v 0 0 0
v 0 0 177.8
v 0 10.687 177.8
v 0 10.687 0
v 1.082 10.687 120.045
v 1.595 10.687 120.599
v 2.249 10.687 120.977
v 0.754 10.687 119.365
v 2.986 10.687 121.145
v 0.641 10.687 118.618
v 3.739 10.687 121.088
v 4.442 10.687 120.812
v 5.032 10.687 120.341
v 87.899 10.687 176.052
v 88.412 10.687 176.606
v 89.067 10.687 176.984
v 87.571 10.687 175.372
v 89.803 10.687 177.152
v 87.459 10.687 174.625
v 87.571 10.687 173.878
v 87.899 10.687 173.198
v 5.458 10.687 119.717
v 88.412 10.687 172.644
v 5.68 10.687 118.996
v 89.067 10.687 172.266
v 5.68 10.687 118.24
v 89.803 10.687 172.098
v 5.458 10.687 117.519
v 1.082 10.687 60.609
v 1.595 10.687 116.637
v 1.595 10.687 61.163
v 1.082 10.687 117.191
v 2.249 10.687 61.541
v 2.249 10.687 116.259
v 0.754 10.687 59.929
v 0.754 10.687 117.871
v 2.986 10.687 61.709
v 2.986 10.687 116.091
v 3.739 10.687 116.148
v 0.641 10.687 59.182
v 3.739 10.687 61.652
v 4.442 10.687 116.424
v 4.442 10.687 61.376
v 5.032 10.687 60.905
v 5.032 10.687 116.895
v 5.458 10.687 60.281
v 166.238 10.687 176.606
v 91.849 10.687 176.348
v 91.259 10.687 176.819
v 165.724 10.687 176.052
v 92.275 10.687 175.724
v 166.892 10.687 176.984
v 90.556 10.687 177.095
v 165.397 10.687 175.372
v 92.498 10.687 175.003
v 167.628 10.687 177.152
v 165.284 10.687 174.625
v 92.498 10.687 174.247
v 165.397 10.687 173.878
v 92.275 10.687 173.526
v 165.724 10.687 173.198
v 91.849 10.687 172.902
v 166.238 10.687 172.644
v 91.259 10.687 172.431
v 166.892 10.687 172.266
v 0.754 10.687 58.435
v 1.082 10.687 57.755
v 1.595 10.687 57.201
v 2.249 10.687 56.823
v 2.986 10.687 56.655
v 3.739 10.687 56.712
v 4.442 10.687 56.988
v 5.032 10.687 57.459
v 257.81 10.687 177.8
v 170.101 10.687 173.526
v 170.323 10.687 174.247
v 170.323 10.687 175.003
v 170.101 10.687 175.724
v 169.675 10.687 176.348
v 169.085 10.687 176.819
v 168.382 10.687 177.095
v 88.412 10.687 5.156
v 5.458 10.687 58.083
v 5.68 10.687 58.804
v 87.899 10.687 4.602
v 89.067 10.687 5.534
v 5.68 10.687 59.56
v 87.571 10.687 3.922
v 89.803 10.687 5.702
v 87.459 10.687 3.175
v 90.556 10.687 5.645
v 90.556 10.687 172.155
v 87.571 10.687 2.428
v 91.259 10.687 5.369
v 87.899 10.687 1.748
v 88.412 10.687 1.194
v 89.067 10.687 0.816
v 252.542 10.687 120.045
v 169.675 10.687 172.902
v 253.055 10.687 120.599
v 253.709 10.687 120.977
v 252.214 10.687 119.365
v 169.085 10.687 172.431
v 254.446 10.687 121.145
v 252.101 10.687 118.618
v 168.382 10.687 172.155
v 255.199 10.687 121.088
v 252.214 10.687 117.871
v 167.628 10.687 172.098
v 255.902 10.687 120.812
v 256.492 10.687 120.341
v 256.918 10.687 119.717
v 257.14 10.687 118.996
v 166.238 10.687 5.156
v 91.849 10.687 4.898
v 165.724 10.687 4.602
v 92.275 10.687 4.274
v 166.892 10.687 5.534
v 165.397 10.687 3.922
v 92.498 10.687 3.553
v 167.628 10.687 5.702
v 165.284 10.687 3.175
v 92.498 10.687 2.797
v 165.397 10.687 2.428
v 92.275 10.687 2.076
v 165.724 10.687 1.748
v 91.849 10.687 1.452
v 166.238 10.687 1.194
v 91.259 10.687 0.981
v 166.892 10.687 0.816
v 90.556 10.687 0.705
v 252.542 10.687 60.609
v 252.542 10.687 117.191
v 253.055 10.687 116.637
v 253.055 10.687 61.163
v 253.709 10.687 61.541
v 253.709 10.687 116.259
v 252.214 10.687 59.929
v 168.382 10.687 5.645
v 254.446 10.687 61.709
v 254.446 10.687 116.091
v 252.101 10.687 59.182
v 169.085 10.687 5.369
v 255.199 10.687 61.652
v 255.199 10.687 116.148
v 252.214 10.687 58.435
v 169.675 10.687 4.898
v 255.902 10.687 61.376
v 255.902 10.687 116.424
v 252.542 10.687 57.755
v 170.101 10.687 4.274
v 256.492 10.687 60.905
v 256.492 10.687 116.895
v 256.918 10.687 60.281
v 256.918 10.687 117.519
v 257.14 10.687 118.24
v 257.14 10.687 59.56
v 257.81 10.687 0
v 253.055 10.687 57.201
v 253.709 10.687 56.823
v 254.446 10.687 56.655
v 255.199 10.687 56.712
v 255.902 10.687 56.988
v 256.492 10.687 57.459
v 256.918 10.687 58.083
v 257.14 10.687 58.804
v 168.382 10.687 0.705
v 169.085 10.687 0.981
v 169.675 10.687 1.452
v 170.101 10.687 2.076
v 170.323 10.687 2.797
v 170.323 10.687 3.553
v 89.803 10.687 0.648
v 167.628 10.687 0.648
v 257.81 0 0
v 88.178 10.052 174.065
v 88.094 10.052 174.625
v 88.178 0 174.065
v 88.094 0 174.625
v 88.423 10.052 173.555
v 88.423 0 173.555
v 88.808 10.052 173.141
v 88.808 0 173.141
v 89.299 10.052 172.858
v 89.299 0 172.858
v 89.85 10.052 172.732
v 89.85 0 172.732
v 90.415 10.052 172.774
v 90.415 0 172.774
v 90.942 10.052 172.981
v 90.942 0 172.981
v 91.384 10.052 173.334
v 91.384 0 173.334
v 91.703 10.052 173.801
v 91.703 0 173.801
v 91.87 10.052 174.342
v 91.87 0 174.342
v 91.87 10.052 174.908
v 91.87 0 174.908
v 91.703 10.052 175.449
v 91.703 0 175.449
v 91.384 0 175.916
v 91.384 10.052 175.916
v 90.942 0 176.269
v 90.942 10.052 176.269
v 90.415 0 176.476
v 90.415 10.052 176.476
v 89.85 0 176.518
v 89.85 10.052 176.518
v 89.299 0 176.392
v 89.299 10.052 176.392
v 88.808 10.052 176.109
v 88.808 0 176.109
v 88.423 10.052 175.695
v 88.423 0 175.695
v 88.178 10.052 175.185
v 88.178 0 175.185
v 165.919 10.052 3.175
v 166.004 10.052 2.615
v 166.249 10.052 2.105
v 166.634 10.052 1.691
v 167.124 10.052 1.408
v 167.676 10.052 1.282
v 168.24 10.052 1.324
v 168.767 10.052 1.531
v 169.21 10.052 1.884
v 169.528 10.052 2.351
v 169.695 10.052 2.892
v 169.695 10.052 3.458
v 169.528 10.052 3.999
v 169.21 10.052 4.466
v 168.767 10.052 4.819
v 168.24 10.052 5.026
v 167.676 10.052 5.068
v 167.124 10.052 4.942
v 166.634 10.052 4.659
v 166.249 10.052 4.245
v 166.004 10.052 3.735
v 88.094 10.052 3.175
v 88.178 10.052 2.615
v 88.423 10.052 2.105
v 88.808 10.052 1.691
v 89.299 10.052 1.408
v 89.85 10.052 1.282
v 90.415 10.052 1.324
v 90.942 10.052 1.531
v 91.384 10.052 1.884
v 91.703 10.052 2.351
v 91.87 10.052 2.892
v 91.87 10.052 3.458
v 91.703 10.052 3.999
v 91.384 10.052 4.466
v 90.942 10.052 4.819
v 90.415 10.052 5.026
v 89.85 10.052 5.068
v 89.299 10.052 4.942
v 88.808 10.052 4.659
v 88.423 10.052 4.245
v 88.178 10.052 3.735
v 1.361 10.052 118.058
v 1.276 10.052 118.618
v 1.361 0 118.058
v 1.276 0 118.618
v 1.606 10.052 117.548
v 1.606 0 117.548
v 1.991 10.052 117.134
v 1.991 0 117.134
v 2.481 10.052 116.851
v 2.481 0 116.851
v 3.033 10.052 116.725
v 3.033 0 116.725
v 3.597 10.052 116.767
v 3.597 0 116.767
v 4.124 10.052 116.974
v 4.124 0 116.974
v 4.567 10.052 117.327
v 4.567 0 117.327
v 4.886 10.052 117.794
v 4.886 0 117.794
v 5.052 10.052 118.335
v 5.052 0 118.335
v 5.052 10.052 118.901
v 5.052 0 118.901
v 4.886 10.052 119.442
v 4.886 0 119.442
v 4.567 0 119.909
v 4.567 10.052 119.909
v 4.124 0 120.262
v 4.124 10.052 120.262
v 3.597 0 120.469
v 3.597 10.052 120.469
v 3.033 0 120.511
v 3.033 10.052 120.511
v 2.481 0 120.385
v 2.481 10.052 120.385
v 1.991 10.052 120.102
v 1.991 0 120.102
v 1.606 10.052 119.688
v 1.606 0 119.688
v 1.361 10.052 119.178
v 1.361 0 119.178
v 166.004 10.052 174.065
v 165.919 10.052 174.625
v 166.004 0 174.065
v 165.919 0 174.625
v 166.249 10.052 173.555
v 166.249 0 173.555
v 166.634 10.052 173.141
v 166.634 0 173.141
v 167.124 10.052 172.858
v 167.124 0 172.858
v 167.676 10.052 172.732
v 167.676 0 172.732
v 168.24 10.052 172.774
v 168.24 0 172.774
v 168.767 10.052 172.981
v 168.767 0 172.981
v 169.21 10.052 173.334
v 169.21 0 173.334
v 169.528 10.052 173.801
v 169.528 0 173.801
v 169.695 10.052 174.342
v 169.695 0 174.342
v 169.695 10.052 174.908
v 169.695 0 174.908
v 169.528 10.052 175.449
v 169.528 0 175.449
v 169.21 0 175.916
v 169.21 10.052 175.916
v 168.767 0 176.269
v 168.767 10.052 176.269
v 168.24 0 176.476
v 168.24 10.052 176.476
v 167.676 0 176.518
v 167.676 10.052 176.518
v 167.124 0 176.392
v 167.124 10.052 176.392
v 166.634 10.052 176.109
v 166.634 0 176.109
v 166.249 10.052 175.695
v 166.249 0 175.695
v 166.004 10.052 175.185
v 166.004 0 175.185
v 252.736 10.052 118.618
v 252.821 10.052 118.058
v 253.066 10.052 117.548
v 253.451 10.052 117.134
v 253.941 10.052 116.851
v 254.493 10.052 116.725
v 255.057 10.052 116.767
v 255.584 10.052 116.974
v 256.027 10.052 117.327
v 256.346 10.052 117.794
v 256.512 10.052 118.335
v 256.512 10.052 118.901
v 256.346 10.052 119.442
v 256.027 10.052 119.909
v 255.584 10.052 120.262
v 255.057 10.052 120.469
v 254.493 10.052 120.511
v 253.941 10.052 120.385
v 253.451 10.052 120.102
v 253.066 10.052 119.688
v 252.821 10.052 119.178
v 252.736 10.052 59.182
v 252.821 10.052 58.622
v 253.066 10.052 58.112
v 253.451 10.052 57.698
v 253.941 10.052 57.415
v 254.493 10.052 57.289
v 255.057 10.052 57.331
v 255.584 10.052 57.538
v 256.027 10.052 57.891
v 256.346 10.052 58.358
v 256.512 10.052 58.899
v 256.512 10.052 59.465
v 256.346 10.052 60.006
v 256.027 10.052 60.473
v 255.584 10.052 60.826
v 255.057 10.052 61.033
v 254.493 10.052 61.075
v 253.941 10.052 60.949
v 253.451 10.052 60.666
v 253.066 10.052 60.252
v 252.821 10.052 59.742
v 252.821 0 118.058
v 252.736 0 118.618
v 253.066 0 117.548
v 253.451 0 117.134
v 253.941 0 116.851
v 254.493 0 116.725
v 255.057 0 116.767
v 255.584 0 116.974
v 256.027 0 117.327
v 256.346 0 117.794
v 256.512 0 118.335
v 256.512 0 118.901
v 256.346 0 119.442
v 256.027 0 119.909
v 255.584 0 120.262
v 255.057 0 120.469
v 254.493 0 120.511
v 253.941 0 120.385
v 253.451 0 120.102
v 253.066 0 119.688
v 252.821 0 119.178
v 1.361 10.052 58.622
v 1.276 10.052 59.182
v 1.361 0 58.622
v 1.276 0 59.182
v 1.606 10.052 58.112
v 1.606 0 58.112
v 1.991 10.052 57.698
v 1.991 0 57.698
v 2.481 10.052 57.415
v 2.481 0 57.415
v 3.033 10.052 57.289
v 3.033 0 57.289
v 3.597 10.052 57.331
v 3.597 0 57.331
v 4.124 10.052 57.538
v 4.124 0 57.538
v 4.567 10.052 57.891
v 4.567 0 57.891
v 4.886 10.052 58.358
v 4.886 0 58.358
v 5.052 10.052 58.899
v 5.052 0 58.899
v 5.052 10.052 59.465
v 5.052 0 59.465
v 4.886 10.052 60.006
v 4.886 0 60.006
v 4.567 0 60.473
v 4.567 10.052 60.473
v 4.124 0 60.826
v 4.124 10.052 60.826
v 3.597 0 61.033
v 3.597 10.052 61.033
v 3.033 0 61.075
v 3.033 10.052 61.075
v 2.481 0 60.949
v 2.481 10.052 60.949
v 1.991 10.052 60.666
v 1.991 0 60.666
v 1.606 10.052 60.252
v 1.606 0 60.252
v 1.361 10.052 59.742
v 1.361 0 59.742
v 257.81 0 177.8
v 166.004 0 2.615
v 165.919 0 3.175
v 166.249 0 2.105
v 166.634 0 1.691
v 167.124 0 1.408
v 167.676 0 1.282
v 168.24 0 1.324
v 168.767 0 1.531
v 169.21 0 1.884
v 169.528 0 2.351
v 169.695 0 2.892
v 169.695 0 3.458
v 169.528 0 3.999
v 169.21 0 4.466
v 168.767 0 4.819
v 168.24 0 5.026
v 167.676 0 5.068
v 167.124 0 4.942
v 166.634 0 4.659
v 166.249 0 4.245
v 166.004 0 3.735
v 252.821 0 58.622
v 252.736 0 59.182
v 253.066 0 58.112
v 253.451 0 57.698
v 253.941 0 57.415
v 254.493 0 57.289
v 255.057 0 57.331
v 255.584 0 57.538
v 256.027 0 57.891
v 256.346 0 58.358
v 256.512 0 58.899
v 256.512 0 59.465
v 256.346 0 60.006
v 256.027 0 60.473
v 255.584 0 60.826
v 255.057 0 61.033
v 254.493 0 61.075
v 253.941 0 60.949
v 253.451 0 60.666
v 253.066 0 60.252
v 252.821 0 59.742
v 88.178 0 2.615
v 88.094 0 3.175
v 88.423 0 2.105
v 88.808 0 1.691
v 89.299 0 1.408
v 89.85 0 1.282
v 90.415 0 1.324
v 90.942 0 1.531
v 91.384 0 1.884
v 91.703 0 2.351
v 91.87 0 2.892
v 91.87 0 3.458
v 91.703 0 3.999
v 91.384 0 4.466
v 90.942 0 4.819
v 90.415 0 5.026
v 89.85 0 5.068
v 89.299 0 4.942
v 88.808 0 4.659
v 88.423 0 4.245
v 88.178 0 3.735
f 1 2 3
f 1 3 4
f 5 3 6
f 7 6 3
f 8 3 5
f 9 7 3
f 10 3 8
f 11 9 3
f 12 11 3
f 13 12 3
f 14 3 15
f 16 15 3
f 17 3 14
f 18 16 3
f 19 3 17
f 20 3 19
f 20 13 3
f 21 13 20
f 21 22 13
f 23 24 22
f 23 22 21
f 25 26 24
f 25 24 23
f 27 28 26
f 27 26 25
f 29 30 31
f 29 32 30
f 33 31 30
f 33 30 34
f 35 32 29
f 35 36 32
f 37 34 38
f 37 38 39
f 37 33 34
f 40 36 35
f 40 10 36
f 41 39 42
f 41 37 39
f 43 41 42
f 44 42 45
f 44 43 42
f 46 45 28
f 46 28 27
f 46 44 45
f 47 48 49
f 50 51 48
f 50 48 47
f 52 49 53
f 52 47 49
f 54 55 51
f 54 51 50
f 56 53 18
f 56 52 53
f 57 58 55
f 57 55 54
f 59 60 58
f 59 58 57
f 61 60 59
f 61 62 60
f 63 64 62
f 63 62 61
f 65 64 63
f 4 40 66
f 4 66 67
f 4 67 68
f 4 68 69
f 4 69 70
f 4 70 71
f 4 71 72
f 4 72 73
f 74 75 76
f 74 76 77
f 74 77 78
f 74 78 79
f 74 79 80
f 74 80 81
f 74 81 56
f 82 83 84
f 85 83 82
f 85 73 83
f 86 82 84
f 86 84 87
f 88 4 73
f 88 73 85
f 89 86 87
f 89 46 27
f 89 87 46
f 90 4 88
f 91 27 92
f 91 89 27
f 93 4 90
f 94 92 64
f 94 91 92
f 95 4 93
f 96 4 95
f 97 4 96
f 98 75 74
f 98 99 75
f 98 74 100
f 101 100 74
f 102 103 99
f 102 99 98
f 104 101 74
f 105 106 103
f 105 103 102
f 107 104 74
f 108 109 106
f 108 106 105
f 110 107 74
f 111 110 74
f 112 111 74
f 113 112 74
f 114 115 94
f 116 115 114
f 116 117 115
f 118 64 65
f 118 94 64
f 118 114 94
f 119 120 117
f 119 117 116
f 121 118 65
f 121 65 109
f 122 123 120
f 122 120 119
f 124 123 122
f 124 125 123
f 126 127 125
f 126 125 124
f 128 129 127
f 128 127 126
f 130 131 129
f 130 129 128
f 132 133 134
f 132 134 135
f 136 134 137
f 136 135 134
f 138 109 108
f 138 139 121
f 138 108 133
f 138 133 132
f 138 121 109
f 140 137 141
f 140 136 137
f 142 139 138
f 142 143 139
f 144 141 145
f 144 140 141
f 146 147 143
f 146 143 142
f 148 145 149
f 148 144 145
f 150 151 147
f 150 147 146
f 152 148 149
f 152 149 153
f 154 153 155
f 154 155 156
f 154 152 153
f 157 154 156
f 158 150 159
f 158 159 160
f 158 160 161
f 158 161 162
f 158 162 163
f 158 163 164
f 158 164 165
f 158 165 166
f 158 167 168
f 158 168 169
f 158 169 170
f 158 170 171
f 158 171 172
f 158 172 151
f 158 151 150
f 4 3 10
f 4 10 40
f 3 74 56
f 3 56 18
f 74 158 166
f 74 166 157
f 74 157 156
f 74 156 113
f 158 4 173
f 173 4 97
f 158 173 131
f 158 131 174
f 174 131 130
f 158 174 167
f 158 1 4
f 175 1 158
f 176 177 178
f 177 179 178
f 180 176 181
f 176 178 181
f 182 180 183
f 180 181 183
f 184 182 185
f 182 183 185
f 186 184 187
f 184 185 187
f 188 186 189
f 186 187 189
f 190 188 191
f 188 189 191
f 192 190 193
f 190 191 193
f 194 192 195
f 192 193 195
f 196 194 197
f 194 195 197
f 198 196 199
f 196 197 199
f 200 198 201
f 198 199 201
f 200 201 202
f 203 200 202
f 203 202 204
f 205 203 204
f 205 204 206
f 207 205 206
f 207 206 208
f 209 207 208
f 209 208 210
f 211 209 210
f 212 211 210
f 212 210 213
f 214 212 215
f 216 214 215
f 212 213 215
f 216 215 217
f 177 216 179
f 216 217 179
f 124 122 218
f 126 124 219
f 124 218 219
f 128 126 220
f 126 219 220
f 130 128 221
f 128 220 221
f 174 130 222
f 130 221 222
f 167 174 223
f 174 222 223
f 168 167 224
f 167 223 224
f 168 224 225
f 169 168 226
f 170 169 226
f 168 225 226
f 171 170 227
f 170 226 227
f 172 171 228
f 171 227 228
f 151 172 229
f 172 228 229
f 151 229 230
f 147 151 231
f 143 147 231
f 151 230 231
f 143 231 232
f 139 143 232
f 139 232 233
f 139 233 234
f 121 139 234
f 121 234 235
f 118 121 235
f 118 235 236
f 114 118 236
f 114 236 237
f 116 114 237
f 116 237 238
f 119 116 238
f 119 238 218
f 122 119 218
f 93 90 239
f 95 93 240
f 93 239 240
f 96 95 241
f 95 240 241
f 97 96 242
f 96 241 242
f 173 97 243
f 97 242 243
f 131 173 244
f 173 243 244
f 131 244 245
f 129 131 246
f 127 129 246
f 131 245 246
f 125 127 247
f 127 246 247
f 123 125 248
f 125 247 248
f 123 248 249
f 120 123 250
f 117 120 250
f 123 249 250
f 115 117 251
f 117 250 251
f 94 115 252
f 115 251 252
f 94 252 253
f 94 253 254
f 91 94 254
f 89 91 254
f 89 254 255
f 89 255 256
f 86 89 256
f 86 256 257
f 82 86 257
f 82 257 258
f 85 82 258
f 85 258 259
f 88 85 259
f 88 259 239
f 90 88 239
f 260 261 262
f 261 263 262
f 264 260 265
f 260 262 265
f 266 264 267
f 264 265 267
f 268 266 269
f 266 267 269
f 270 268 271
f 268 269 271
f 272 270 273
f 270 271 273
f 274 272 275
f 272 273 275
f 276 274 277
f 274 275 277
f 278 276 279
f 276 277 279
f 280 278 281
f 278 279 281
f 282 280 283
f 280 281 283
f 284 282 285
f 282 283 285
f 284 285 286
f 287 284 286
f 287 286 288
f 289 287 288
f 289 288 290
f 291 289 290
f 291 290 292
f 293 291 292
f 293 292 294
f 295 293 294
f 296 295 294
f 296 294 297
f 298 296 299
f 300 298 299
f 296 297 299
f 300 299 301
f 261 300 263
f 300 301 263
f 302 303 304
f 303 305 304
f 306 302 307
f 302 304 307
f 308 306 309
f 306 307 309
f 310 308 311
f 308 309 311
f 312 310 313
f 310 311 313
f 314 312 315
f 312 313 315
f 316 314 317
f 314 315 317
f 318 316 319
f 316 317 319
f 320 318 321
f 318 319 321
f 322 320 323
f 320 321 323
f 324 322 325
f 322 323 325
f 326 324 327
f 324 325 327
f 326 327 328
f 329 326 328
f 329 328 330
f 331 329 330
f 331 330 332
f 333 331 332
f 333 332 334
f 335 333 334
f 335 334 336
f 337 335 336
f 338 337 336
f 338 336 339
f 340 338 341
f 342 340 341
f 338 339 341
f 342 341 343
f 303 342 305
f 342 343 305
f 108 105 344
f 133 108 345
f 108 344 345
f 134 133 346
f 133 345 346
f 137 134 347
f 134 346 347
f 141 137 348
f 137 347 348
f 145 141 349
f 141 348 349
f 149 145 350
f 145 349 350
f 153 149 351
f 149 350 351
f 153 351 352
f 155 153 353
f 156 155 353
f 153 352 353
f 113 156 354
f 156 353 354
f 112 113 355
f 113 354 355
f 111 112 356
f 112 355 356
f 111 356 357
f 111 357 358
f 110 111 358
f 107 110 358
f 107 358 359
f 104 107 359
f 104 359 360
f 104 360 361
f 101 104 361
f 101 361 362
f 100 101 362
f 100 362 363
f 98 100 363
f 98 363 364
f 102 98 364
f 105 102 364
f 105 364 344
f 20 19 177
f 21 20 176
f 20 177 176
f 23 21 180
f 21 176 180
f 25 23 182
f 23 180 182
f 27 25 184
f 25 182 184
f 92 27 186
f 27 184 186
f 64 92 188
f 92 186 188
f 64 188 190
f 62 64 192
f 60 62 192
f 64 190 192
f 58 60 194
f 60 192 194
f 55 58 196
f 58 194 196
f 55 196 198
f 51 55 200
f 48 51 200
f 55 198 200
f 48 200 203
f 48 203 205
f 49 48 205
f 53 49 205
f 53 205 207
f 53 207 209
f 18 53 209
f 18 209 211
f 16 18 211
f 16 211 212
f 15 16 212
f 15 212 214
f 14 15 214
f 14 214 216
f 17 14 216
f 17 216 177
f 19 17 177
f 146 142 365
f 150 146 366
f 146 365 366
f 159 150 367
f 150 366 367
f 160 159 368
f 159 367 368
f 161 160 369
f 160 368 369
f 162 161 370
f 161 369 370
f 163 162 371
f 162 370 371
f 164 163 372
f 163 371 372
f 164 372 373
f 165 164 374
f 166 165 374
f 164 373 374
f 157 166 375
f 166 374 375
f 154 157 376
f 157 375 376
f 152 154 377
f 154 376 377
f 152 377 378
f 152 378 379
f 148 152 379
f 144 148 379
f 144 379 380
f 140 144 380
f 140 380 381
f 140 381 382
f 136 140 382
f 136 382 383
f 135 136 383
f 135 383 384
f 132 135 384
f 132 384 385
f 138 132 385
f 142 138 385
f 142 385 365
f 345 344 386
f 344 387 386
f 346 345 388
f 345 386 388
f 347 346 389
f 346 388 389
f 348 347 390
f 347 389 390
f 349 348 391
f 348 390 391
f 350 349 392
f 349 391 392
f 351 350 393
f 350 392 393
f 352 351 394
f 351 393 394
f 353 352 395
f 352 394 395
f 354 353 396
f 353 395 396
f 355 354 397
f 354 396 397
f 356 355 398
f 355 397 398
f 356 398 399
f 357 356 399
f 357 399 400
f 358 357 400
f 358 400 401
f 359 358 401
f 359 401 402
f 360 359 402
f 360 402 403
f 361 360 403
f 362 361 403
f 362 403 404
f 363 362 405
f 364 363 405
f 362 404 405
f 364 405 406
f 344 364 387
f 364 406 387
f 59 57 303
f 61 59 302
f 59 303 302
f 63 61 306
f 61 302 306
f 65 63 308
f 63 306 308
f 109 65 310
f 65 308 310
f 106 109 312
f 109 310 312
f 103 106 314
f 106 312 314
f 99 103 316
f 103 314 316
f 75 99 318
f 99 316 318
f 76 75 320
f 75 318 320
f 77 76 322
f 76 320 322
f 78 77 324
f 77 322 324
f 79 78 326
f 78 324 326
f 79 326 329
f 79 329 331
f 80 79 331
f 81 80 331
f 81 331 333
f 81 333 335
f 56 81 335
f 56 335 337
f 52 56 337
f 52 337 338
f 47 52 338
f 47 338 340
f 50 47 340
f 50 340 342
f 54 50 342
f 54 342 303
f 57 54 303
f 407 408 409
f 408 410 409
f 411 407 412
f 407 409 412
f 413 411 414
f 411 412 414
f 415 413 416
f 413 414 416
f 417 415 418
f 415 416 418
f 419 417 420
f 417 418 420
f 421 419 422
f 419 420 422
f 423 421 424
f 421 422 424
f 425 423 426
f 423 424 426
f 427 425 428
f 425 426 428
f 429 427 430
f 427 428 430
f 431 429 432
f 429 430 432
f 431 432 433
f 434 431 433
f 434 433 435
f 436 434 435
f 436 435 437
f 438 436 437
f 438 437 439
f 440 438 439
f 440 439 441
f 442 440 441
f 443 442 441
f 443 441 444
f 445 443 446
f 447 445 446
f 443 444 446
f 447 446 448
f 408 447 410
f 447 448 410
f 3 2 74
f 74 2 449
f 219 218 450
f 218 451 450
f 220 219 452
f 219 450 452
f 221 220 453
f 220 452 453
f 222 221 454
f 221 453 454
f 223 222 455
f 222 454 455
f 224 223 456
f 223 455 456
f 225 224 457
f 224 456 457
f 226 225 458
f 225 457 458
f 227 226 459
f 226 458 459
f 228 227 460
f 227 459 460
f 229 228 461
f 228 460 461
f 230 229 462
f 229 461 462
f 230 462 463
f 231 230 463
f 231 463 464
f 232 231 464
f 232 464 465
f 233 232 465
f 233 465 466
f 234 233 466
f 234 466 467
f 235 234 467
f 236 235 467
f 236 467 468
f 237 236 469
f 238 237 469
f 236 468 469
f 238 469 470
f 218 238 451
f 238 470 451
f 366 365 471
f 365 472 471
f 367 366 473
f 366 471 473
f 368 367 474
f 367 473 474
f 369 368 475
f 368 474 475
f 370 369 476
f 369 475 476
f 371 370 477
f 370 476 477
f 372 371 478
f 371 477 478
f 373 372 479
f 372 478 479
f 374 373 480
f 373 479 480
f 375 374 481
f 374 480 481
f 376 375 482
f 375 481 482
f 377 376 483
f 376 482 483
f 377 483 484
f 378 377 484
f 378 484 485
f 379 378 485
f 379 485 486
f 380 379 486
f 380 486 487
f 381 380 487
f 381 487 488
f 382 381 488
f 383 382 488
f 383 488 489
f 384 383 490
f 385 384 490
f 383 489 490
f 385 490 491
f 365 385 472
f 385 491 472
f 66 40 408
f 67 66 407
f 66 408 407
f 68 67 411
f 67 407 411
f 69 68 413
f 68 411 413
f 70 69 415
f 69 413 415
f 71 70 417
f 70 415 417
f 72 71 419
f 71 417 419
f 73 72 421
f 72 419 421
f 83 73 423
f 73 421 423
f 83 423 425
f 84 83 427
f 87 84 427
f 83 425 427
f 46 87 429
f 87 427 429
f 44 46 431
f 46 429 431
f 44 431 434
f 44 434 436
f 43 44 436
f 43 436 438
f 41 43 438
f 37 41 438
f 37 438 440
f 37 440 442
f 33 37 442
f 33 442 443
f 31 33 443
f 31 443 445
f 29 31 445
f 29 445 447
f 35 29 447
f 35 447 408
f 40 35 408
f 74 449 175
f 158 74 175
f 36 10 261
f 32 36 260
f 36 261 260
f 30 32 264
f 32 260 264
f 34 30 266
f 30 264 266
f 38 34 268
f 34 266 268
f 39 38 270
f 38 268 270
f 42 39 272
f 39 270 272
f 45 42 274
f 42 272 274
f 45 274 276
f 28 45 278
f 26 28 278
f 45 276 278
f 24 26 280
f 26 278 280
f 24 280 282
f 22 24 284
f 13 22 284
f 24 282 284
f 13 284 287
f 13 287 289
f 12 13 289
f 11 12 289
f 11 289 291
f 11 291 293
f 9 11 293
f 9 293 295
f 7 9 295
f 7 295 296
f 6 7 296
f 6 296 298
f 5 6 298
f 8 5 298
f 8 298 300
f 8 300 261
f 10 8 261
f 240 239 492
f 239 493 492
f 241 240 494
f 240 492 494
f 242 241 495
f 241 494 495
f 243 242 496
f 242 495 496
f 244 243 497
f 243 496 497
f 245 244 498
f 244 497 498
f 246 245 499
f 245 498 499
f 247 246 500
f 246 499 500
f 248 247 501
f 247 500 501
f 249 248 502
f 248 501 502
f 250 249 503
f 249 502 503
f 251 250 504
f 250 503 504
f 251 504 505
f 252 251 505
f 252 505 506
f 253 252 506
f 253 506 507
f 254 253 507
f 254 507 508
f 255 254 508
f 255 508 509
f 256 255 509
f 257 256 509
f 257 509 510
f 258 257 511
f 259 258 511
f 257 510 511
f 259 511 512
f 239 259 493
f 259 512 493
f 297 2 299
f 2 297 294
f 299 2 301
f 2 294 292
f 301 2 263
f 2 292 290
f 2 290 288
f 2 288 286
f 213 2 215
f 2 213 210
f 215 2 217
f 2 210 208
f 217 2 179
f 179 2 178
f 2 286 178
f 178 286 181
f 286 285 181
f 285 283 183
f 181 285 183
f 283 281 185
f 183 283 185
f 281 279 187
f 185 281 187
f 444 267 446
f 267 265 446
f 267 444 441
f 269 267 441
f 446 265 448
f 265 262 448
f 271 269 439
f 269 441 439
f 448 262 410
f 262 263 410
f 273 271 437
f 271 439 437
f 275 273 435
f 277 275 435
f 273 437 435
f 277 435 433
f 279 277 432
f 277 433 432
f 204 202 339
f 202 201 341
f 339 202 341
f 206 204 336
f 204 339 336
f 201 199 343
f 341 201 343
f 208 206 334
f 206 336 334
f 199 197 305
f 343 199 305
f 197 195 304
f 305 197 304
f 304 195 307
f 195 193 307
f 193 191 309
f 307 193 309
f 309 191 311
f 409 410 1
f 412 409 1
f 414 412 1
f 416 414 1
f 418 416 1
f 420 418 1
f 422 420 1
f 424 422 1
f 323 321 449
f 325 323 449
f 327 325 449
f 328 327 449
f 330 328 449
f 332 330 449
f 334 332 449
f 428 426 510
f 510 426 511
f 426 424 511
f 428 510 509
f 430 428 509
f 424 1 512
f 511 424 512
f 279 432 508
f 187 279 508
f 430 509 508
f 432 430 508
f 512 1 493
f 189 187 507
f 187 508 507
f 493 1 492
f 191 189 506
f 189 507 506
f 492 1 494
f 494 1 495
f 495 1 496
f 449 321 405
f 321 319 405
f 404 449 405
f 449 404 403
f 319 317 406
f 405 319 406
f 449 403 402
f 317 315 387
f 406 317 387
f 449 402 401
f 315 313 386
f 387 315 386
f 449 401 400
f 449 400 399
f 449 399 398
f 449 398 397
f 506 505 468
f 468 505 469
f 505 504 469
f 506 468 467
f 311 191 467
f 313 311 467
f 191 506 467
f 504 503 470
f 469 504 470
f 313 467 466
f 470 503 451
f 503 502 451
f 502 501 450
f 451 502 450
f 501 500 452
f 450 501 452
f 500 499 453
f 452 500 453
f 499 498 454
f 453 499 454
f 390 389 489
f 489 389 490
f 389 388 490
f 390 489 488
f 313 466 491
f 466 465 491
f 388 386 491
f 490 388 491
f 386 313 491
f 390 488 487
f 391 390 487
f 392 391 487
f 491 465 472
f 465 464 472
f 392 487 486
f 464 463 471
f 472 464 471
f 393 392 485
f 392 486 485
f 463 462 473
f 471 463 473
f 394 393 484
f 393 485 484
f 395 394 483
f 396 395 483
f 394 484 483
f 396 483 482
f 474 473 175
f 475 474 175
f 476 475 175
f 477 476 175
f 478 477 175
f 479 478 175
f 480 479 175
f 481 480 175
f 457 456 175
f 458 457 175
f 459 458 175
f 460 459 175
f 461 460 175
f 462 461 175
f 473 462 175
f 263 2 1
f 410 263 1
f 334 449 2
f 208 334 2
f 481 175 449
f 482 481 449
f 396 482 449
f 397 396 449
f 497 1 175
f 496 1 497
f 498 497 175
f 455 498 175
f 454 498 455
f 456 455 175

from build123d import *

# Parameters (mm, degrees)
SKETCH1_W                       = 257.81
SKETCH1_H                       = 177.8
BOSS_EXTRUDE1_DEPTH             = 10.687382177
F_6_CLEARANCE_HOLE1_D           = 3.7973
F_6_CLEARANCE_HOLE1_CSINK_D     = 5.0673
F_6_CLEARANCE_HOLE1_CSINK_ANGLE = 90


with BuildPart() as part:
    # Sketch1 → Boss-Extrude1 (new body)
    with BuildSketch(Plane(origin=(0, 0, 0), x_dir=(1, 0, 0), z_dir=(0, 1, 0))):
        with Locations((128.905, -88.9)):
            Rectangle(SKETCH1_W, SKETCH1_H)
    extrude(amount=BOSS_EXTRUDE1_DEPTH)

    # #6 Clearance Hole1 (through all)
    with Locations(Plane(origin=(0, 10.687382177, 0), x_dir=(1, 0, 0), z_dir=(0, 1, 0))):
        with Locations((3.175, -59.182), (89.9922, -3.175), (3.175, -118.618), (167.8178, -3.175), (254.635, -59.182), (254.635, -118.618), (167.8178, -174.625), (89.9922, -174.625)):
            CounterSinkHole(F_6_CLEARANCE_HOLE1_D / 2, F_6_CLEARANCE_HOLE1_CSINK_D / 2, counter_sink_angle=F_6_CLEARANCE_HOLE1_CSINK_ANGLE)


solid = part.part
